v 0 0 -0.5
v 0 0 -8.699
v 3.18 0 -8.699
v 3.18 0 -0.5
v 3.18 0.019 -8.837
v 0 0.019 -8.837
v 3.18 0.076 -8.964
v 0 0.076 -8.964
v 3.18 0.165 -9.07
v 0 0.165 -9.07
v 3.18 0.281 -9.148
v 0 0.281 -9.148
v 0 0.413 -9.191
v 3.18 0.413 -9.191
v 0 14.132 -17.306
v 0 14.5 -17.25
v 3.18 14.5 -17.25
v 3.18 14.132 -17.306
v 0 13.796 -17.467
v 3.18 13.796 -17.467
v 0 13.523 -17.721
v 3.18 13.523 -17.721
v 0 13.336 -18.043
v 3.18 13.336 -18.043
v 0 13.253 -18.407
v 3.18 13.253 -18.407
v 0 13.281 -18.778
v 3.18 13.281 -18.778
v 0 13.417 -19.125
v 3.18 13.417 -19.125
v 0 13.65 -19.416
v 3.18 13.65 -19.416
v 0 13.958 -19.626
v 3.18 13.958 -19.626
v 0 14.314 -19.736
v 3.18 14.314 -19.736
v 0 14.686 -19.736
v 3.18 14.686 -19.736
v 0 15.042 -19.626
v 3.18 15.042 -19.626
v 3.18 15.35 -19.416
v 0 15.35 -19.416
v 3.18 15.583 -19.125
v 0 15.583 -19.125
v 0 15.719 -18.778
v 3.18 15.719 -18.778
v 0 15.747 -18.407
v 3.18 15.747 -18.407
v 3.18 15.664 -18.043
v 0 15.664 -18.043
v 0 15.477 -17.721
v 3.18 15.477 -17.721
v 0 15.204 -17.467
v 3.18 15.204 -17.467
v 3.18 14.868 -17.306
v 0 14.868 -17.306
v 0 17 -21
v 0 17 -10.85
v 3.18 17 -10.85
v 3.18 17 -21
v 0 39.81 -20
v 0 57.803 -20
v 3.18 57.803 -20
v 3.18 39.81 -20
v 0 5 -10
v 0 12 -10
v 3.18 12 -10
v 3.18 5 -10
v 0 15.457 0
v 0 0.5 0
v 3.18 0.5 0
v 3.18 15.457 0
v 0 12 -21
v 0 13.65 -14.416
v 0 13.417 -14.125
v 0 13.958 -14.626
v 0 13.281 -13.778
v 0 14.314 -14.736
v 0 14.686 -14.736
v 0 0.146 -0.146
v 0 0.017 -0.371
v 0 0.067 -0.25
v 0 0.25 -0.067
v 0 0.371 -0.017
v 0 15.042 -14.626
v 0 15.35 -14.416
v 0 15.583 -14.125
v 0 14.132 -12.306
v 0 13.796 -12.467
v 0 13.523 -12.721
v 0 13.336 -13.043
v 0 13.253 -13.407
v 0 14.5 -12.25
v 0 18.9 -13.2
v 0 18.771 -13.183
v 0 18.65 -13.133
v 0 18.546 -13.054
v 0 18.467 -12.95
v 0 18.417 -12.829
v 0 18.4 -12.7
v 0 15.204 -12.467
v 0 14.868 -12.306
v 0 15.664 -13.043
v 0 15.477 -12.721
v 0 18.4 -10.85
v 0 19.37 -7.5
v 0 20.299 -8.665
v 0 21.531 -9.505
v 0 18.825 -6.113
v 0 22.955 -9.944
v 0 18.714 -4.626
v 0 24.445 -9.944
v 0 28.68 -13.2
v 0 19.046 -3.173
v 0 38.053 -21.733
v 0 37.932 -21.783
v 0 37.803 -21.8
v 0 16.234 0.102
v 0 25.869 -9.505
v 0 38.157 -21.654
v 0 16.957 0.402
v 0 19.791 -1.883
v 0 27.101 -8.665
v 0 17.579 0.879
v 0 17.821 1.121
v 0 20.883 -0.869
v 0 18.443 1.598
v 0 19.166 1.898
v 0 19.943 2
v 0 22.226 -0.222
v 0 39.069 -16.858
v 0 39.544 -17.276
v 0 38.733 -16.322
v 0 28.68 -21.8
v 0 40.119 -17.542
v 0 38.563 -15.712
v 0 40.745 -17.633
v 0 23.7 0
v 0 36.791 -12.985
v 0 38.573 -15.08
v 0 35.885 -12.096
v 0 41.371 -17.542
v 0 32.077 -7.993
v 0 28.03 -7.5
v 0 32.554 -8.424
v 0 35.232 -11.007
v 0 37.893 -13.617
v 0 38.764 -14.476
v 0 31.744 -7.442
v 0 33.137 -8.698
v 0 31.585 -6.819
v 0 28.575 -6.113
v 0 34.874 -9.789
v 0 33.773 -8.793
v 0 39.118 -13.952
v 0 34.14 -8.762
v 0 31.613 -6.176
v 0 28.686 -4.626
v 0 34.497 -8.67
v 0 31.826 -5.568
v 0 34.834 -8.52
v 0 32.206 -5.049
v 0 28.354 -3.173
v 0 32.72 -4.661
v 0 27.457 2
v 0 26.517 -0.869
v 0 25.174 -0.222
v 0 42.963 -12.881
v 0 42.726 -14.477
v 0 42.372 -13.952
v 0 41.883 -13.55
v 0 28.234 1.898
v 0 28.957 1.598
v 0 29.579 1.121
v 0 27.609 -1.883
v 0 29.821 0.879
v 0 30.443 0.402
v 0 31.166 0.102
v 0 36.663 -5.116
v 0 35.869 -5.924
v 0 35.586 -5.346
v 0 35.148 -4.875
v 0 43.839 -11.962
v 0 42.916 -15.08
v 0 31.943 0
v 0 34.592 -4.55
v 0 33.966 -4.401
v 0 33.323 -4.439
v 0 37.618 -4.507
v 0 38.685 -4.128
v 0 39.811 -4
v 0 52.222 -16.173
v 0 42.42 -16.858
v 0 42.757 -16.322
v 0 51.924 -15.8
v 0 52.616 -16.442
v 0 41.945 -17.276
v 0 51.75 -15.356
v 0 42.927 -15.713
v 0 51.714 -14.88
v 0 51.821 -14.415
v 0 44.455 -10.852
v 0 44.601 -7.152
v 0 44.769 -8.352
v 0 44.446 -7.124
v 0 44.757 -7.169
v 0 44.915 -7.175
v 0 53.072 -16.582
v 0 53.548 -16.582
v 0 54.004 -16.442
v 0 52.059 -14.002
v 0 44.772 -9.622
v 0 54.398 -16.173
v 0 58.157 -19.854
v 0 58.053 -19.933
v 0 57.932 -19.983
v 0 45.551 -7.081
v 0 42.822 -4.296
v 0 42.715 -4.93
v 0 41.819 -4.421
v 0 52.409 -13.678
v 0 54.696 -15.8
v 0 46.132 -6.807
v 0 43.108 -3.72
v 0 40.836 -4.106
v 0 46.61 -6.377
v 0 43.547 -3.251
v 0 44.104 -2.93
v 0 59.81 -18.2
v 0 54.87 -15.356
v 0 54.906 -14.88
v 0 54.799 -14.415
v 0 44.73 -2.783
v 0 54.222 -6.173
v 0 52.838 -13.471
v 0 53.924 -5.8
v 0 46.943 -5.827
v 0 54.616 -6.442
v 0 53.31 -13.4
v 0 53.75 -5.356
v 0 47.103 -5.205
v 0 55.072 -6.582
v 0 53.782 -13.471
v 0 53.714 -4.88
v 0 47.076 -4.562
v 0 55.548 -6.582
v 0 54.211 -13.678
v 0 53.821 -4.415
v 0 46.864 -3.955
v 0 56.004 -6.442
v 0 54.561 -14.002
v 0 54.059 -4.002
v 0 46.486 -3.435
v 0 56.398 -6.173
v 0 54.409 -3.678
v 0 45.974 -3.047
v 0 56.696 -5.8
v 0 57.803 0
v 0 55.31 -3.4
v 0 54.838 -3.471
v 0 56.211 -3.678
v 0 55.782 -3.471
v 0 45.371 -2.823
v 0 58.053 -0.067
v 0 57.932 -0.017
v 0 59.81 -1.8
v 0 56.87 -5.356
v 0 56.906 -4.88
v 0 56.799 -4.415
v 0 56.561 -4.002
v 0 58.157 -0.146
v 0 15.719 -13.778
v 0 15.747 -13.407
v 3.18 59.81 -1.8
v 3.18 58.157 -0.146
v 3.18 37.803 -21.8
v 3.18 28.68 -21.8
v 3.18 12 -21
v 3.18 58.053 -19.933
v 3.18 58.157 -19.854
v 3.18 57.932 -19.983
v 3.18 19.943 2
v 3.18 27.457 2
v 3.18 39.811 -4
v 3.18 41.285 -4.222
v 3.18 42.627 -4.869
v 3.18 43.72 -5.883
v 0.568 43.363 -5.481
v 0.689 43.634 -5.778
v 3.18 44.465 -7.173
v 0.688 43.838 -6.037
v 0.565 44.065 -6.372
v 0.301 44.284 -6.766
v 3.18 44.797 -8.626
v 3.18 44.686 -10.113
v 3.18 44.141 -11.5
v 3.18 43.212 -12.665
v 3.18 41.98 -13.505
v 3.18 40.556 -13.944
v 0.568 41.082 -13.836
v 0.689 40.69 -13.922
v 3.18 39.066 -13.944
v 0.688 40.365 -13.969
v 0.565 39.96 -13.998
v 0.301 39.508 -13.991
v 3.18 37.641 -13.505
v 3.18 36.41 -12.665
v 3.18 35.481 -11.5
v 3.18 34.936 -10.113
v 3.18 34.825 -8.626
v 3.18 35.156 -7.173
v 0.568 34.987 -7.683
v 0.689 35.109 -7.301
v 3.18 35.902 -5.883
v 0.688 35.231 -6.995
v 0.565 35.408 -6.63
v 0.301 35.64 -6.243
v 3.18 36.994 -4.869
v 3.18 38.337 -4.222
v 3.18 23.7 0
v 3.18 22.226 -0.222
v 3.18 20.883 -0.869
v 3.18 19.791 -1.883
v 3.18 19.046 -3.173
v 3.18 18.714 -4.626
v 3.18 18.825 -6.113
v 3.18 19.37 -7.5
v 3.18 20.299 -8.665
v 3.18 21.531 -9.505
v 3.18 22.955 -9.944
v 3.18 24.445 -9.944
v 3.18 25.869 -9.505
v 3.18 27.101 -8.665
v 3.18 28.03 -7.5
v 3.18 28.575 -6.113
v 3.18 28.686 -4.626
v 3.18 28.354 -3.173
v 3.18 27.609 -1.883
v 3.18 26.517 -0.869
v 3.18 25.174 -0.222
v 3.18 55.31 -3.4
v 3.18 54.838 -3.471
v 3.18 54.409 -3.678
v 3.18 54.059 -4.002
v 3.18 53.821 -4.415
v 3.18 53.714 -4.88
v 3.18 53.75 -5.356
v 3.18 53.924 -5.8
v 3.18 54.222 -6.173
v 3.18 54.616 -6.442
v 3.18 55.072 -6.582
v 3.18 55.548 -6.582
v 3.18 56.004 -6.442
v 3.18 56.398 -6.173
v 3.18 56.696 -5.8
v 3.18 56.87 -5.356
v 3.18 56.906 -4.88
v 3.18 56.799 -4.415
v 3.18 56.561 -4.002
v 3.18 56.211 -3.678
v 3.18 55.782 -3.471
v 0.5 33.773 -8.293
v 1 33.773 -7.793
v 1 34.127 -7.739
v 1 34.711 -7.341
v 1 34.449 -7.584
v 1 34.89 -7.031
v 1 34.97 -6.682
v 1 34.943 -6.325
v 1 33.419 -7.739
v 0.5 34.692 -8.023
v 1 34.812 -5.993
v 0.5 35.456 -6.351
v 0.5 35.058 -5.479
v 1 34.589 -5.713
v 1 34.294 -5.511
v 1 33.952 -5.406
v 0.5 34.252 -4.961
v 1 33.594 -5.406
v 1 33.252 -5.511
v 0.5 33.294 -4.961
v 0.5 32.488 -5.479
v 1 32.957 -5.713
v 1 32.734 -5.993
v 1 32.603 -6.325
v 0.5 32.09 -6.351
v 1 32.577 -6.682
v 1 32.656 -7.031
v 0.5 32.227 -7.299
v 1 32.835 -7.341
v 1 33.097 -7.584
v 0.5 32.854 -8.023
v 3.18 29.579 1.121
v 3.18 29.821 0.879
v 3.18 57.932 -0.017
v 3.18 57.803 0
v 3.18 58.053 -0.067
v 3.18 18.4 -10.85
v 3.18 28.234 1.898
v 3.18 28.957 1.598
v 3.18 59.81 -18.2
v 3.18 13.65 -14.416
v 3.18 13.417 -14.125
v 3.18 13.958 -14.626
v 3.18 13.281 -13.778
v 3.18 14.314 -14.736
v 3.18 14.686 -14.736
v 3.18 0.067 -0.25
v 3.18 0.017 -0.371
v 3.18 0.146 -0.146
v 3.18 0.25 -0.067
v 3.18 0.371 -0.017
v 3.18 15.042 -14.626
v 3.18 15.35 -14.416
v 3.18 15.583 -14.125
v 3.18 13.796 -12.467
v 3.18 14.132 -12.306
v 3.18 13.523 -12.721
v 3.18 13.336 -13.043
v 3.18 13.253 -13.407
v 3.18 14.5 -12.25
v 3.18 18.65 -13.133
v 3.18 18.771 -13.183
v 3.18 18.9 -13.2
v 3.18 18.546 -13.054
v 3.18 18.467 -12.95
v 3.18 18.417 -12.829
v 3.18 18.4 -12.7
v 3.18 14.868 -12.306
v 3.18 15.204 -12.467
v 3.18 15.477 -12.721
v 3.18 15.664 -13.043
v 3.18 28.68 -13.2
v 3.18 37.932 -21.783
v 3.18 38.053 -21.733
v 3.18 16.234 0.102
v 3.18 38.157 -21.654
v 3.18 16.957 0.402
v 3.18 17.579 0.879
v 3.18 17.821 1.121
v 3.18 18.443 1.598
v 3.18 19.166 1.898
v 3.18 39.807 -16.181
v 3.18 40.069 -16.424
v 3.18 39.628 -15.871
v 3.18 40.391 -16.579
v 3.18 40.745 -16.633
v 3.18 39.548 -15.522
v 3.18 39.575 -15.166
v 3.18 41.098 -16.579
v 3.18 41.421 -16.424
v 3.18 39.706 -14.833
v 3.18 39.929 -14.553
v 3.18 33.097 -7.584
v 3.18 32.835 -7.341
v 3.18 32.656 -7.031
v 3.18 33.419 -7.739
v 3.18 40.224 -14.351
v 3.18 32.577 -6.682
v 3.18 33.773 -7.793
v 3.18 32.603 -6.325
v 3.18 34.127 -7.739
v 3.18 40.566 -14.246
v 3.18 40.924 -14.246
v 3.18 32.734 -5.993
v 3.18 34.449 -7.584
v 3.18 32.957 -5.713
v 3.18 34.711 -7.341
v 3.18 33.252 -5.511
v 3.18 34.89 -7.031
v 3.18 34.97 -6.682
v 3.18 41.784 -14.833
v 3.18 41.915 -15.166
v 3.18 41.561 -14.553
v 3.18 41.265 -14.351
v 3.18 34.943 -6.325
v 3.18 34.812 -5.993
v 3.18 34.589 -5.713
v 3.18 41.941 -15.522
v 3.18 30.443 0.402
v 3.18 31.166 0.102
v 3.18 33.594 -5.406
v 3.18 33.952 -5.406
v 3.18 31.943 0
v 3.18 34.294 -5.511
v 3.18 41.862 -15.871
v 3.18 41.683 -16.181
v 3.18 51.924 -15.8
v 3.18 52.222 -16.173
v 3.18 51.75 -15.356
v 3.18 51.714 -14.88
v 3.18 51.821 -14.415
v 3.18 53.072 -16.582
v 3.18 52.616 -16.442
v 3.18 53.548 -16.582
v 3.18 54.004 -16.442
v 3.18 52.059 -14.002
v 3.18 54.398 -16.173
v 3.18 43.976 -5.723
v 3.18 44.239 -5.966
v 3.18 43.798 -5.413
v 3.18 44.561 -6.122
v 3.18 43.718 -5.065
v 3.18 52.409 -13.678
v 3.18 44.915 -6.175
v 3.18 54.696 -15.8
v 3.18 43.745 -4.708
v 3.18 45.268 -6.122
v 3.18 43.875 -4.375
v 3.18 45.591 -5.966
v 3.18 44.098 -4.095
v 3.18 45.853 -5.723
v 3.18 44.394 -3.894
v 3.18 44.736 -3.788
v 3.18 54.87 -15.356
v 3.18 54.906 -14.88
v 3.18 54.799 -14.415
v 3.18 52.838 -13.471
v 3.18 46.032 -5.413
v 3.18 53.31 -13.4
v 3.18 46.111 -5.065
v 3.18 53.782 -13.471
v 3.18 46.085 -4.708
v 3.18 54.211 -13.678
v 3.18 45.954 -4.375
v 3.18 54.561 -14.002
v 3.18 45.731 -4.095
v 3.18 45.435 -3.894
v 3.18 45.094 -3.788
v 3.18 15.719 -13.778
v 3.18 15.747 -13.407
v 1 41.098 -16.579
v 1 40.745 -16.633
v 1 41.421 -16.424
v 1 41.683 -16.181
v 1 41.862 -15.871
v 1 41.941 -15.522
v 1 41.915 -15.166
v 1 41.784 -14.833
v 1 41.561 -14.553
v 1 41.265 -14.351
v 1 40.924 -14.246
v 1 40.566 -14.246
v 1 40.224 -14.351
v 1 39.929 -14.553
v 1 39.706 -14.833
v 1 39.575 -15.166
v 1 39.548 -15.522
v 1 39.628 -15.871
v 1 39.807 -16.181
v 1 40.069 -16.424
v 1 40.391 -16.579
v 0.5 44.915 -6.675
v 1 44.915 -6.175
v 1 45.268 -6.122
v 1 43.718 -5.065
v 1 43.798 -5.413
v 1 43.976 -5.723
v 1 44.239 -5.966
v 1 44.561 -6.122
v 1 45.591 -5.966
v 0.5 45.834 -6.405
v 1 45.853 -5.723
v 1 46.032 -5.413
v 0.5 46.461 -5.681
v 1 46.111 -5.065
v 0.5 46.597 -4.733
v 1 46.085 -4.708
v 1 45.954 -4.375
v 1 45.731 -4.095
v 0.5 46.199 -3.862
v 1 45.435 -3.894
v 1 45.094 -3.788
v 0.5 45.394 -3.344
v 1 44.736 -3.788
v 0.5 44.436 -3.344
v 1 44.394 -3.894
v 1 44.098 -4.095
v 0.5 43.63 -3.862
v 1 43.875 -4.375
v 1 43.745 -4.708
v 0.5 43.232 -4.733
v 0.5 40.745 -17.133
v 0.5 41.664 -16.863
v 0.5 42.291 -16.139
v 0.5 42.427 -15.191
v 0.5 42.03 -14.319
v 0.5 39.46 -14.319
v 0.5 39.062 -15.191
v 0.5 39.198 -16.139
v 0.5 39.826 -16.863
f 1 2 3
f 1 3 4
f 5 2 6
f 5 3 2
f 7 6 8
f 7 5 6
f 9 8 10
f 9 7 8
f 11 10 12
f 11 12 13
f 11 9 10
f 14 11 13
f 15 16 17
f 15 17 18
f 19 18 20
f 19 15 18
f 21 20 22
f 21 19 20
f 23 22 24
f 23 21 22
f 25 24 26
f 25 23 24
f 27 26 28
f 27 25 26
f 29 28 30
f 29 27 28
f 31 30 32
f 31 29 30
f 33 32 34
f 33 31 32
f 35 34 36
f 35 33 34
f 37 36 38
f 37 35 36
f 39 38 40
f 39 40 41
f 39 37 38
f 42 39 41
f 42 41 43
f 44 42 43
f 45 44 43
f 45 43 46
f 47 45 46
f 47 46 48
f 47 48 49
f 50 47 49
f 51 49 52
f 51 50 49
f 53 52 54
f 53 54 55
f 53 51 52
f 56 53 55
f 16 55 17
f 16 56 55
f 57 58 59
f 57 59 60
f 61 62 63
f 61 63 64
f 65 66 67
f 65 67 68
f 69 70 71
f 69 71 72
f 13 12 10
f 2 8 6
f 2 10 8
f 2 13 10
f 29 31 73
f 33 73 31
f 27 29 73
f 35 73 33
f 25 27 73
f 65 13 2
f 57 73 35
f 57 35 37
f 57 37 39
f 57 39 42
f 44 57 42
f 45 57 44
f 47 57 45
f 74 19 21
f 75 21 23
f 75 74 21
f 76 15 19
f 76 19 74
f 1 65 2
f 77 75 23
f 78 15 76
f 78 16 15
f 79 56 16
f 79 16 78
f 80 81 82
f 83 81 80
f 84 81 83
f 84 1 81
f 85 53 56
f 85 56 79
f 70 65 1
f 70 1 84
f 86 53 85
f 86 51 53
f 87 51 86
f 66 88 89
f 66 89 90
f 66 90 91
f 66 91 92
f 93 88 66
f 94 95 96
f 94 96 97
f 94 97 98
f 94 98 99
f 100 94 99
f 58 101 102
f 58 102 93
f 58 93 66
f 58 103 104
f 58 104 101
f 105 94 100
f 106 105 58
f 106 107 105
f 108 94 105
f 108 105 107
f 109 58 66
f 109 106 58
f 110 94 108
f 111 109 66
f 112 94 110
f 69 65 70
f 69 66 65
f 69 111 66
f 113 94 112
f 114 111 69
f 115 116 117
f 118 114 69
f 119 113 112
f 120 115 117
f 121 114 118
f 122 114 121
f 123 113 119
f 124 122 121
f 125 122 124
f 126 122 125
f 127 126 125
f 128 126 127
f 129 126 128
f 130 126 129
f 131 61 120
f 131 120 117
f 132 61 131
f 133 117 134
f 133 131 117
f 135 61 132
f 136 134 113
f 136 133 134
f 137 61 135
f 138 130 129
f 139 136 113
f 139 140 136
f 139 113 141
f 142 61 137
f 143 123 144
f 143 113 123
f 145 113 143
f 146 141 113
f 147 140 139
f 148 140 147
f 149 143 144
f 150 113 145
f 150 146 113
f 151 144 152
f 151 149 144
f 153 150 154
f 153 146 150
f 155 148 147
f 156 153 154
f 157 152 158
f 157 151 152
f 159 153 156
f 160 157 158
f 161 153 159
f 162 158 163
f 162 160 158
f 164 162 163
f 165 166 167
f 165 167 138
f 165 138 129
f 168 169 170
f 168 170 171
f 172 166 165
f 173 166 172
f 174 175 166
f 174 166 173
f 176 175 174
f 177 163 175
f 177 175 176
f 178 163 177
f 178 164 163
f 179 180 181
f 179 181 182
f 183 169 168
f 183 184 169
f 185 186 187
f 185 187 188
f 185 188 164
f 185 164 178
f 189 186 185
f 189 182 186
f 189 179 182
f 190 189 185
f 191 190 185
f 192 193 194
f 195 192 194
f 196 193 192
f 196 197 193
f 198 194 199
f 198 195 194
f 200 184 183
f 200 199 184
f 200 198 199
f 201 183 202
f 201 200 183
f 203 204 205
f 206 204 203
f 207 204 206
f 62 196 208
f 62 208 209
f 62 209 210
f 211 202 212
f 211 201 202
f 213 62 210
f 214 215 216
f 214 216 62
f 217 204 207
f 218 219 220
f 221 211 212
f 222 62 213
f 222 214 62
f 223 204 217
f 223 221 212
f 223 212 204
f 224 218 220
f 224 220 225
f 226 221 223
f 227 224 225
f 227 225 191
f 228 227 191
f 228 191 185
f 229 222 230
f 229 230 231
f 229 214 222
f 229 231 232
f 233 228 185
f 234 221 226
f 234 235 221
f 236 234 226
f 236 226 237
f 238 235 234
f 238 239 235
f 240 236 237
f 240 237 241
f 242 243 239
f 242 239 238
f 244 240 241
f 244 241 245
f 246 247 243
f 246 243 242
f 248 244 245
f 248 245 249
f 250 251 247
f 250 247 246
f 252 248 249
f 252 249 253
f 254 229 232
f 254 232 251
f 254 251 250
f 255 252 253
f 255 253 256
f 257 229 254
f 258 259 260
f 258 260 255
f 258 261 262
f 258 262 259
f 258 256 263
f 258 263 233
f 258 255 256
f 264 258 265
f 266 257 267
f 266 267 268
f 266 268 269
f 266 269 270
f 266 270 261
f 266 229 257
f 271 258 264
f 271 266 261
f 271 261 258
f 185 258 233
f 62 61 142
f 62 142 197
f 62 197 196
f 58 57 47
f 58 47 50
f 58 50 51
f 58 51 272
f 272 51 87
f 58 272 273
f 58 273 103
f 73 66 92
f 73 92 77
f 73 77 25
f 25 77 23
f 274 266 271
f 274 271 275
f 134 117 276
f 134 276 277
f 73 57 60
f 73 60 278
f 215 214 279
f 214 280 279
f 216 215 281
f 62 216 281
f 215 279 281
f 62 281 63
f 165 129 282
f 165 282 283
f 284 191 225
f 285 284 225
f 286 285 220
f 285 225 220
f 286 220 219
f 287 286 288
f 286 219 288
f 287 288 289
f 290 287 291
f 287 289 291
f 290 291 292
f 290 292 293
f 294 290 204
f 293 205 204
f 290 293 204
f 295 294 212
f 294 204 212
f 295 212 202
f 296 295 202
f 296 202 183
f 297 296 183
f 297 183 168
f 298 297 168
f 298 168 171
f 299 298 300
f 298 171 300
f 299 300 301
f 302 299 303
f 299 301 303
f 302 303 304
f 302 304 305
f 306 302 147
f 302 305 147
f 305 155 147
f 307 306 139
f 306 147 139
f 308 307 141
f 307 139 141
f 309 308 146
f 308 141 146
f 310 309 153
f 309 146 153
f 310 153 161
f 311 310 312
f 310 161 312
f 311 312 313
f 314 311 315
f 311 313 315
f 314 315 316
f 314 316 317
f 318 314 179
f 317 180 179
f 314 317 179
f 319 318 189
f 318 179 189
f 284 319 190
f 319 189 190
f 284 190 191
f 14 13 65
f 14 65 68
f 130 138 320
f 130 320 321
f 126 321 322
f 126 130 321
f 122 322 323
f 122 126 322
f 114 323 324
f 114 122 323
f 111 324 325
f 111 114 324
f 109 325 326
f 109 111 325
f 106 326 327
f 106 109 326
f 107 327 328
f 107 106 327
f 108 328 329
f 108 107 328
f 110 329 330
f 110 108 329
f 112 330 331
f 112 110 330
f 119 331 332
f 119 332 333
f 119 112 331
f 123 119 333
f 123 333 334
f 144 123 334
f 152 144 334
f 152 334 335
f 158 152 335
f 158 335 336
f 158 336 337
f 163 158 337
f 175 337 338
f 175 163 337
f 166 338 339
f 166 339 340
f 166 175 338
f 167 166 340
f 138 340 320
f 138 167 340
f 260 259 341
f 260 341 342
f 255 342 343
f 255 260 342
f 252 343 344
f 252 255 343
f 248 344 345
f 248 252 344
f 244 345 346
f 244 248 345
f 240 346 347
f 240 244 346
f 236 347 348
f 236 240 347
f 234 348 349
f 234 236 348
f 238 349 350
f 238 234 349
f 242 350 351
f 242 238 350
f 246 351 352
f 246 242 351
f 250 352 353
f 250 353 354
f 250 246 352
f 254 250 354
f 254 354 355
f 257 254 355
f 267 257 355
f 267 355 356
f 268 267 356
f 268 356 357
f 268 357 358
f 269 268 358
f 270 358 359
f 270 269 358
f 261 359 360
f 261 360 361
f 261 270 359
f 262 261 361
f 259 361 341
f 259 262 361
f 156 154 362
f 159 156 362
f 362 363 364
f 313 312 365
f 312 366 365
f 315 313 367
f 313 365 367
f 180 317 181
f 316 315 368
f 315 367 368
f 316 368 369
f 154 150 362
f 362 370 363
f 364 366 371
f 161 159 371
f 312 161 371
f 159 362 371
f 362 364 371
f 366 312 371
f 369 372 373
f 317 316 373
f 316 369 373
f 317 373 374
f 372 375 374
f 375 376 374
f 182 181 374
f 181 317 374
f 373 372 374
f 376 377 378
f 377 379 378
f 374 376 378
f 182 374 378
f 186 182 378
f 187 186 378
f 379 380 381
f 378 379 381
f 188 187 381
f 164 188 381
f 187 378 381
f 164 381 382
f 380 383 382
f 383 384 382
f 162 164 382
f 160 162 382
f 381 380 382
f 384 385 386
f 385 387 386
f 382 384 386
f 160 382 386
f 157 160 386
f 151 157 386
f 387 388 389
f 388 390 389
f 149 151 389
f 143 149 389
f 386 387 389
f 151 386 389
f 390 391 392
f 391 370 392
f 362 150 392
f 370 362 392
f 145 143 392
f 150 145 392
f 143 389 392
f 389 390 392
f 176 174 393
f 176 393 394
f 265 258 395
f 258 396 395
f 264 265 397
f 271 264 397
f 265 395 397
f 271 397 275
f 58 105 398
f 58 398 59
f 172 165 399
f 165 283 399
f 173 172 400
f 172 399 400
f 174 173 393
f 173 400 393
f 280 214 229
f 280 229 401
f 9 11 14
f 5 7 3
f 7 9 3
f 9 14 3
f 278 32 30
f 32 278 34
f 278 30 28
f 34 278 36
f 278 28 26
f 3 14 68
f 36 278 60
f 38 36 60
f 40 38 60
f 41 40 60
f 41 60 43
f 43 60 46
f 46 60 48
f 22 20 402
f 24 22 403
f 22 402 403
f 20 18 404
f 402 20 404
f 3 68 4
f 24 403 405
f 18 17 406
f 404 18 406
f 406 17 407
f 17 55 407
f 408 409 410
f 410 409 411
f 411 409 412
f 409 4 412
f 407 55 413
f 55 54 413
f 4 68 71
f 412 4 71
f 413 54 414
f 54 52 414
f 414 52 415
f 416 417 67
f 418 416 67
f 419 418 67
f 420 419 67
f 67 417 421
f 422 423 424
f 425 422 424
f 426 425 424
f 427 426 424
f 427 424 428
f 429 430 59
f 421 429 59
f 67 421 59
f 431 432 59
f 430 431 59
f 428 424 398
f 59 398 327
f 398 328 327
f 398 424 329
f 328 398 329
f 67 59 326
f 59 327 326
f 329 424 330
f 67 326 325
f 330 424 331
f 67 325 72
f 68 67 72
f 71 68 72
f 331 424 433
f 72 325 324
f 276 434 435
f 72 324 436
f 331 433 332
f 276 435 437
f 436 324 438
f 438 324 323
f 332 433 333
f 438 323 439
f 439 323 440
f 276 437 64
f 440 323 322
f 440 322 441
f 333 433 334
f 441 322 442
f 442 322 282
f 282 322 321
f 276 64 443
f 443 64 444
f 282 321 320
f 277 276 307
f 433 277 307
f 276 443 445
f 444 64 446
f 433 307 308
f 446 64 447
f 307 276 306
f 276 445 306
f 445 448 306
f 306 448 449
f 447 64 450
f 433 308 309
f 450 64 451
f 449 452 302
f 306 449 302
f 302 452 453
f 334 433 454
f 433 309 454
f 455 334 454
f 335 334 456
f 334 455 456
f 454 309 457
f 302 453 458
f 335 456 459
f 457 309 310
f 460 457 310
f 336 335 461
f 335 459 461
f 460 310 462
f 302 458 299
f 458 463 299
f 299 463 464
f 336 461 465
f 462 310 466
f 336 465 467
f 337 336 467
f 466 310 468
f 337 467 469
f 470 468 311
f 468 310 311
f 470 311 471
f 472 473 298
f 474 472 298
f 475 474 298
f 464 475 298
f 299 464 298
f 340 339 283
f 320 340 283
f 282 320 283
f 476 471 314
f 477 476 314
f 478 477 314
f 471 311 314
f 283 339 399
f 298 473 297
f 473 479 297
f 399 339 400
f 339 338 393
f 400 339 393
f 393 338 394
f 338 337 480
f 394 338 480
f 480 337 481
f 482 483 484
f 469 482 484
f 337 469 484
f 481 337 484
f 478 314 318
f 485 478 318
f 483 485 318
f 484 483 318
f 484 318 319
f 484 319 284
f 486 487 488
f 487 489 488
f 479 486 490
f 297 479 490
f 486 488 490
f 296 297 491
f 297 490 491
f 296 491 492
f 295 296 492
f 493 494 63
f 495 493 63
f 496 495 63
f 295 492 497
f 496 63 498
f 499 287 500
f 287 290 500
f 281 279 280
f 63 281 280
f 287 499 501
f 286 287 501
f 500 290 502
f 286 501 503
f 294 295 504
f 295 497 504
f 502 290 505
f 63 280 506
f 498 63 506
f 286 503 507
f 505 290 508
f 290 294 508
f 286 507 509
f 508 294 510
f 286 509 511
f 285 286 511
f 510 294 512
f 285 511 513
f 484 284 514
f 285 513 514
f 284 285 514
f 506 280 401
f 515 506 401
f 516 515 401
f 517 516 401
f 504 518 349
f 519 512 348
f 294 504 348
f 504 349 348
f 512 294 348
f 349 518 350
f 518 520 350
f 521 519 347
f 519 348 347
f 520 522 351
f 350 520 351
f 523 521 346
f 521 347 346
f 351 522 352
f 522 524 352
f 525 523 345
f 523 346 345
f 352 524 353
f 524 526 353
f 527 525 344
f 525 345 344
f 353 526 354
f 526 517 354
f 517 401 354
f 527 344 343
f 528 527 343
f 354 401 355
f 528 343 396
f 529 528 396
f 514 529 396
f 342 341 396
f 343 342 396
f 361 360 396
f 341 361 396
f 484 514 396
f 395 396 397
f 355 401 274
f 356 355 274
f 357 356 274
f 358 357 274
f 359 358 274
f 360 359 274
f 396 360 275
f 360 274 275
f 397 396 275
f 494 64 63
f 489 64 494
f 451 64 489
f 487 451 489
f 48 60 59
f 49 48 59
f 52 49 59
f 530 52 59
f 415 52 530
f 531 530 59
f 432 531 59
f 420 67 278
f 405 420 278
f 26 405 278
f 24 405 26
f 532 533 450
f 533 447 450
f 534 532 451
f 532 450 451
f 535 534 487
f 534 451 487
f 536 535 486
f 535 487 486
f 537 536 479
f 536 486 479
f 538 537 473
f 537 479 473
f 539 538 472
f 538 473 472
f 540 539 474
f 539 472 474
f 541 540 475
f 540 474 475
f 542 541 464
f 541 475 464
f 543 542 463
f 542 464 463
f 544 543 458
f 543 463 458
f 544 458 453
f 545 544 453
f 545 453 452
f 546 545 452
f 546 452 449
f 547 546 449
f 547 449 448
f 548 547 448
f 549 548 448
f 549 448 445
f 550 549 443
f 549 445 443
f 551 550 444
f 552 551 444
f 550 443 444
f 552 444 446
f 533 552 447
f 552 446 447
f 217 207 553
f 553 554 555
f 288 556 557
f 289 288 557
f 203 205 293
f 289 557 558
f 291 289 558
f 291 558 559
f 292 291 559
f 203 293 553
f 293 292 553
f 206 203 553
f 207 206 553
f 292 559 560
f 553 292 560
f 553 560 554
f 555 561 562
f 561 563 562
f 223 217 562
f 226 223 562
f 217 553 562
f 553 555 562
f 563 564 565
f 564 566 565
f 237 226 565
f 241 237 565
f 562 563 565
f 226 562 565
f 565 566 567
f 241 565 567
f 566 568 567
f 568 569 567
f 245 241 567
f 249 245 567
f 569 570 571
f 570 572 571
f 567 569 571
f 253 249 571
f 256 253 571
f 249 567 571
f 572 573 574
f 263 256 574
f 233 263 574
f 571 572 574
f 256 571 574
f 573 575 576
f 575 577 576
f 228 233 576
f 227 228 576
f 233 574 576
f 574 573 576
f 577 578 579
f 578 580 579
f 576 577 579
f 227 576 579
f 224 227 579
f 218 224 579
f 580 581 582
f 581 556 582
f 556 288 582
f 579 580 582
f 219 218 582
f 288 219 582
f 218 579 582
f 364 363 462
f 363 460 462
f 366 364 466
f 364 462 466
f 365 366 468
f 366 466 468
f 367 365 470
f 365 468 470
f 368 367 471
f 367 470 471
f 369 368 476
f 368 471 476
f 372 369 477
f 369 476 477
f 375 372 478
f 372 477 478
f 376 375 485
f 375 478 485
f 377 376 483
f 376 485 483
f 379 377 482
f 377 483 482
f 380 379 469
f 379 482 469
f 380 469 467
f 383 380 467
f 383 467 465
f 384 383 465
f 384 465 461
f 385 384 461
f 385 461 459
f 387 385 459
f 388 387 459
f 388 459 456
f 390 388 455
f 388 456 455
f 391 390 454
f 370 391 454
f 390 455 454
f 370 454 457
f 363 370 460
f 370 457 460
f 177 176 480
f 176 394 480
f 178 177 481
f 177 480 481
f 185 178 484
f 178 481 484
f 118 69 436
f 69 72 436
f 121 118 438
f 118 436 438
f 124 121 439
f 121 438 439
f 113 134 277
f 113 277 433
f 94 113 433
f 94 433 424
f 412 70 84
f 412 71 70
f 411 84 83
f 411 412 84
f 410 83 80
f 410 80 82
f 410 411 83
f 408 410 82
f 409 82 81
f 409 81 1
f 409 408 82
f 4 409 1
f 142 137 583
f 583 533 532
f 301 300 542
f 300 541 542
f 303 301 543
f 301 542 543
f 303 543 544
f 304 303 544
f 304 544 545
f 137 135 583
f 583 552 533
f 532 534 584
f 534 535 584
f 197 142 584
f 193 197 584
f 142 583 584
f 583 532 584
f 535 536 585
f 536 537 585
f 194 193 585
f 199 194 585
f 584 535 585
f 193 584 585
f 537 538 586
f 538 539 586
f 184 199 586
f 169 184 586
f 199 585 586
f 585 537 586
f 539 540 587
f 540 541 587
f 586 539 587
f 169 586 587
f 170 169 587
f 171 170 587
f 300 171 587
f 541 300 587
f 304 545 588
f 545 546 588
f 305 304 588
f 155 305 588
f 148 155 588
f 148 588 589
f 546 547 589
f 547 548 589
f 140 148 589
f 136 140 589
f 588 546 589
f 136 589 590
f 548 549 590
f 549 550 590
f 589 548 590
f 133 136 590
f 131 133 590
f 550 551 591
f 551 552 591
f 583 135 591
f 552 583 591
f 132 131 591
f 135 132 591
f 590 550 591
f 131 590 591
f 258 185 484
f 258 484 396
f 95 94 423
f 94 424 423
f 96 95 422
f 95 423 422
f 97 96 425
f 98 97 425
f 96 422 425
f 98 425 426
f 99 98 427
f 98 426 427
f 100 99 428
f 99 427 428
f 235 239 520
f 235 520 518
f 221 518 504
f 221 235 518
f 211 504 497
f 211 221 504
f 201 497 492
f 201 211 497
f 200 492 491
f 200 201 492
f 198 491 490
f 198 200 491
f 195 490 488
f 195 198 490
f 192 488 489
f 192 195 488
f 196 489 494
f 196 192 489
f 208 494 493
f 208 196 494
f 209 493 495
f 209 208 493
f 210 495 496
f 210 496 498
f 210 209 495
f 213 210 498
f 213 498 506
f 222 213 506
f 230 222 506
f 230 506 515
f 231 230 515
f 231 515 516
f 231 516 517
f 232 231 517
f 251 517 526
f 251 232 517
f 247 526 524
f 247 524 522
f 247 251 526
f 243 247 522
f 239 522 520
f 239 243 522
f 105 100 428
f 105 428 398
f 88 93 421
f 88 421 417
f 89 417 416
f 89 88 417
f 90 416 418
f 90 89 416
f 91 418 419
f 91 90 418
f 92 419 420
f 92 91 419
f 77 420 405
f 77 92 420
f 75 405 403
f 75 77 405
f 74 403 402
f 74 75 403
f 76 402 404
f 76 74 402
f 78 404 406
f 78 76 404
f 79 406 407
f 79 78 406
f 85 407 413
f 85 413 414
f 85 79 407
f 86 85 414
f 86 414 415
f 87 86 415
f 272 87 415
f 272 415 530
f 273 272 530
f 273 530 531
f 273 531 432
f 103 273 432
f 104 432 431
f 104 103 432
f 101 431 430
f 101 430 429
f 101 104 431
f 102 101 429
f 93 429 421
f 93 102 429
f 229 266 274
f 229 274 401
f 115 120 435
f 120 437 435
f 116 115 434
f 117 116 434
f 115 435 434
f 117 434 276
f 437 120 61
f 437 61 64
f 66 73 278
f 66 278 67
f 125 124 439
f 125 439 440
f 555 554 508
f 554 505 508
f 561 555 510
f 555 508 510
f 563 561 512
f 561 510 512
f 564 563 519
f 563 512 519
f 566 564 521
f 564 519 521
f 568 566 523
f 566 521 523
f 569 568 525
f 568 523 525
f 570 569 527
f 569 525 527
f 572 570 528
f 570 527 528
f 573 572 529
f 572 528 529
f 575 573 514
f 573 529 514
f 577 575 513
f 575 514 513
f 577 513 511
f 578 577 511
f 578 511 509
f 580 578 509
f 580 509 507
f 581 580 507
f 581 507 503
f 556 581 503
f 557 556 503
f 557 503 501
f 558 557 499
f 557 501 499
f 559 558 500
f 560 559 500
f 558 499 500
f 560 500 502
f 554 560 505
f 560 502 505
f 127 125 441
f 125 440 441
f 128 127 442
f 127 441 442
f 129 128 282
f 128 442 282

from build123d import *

# Parameters (mm, degrees)
SKETCH1_R                                       = 5
SKETCH1_R_2                                     = 1.6
SKETCH1_R_3                                     = 1.25
BOSS_EXTRUDE1_DEPTH                             = 3.18
CHAMFER1_SIZE                                   = 5
CHAMFER1_SIZE2                                  = 0.881634904
CSK_FOR_M2_FLAT_HEAD_MACHINE_SCREW1_D           = 2.4
CSK_FOR_M2_FLAT_HEAD_MACHINE_SCREW1_DEPTH       = 3.508967257
CSK_FOR_M2_FLAT_HEAD_MACHINE_SCREW1_CSINK_D     = 4.4
CSK_FOR_M2_FLAT_HEAD_MACHINE_SCREW1_CSINK_ANGLE = 90
CSK_FOR_M2_FLAT_HEAD_MACHINE_SCREW1_TIP         = 0.721032743
SKETCH3_R                                       = 5
CUT_EXTRUDE4_DEPTH                              = 64.738438167
FILLET2_R                                       = 3
CHAMFER2_SIZE                                   = 1.8
FILLET4_R                                       = 0.5


with BuildPart() as part:
    # Sketch1 → Boss-Extrude1 (new body)
    with BuildSketch(Plane(origin=(0, 0, 0), x_dir=(0, 0, -1), z_dir=(1, 0, 0))):
        Polygon((0, 0), (0, 16.7), (-2, 18.7), (-2, 28.7), (0, 30.7), (0, 59.81), (20, 59.81), (20, 39.81), (21.8, 39.81), (21.8, 28.68), (13.2, 28.68), (13.2, 18.4), (10.85, 18.4), (10.85, 17), (21, 17), (21, 12), (10, 12), (10, 0), align=None)
        with Locations(Location((5, 23.7, 0), (0, 0, 180))):
            Circle(SKETCH1_R, mode=Mode.SUBTRACT)
        with Locations(Location((5, 55.31, 0), (0, 0, 180))):
            Circle(SKETCH1_R_2, mode=Mode.SUBTRACT)
        with Locations(Location((15, 53.31, 0), (0, 0, 180))):
            Circle(SKETCH1_R_2, mode=Mode.SUBTRACT)
        with Locations(Location((18.5, 14.5, 0), (0, 0, 180))):
            Circle(SKETCH1_R_3, mode=Mode.SUBTRACT)
        with Locations(Location((13.5, 14.5, 0), (0, 0, 180))):
            Circle(SKETCH1_R_3, mode=Mode.SUBTRACT)
    extrude(amount=BOSS_EXTRUDE1_DEPTH)

    # Chamfer1
    chamfer1_edges = [part.edges().sort_by_distance(p)[0] for p in [
        (1.59, 0, -10),
    ]]
    chamfer1_side = [part.faces().sort_by_distance(p)[0] for p in [
        (1.59, 6, -10),
    ]]
    chamfer(chamfer1_edges, length=CHAMFER1_SIZE, length2=CHAMFER1_SIZE2, reference=chamfer1_side[0])

    # CSK for M2 Flat Head Machine Screw1
    with Locations(Plane.ZY):
        with Locations((-4.974936087, 44.914674329), (-15.432559713, 40.744769284), (-6.592504199, 33.773154083)):
            CounterSinkHole(CSK_FOR_M2_FLAT_HEAD_MACHINE_SCREW1_D / 2, CSK_FOR_M2_FLAT_HEAD_MACHINE_SCREW1_CSINK_D / 2, depth=CSK_FOR_M2_FLAT_HEAD_MACHINE_SCREW1_DEPTH, counter_sink_angle=CSK_FOR_M2_FLAT_HEAD_MACHINE_SCREW1_CSINK_ANGLE)
            with Locations((0, 0, -(CSK_FOR_M2_FLAT_HEAD_MACHINE_SCREW1_DEPTH + CSK_FOR_M2_FLAT_HEAD_MACHINE_SCREW1_TIP / 2))):  # 118° drill point
                Cone(0, CSK_FOR_M2_FLAT_HEAD_MACHINE_SCREW1_D / 2, CSK_FOR_M2_FLAT_HEAD_MACHINE_SCREW1_TIP, mode=Mode.SUBTRACT)

    # Sketch3 → Cut-Extrude4 (cut, through all)
    with BuildSketch(Plane.ZY):
        with Locations((-9, 39.810865899)):
            Circle(SKETCH3_R)
    extrude(amount=-CUT_EXTRUDE4_DEPTH, mode=Mode.SUBTRACT)

    # Fillet2
    fillet2_edges = [part.edges().sort_by_distance(p)[0] for p in [
        (1.59, 16.7, 0),
        (1.59, 18.7, 2),
        (1.59, 28.7, 2),
        (1.59, 30.7, 0),
    ]]
    fillet(fillet2_edges, radius=FILLET2_R)

    # Chamfer2
    chamfer2_edges = [part.edges().sort_by_distance(p)[0] for p in [
        (1.59, 59.81, -20),
        (1.59, 59.81, 0),
        (1.59, 39.81, -21.8),
    ]]
    chamfer(chamfer2_edges, length=CHAMFER2_SIZE - 0.0001)  # a hair under: the kernel refuses the full size

    # Fillet4
    fillet4_edges = [part.edges().sort_by_distance(p)[0] for p in [
        (1.59, 38.0101, -21.8),
        (1.59, 58.0101, -20),
        (1.59, 58.0101, 0),
        (1.59, 0, 0),
        (1.59, 18.4, -13.2),
        (1.59, 0, -9.118365096),
    ]]
    fillet(fillet4_edges, radius=FILLET4_R)


solid = part.part
